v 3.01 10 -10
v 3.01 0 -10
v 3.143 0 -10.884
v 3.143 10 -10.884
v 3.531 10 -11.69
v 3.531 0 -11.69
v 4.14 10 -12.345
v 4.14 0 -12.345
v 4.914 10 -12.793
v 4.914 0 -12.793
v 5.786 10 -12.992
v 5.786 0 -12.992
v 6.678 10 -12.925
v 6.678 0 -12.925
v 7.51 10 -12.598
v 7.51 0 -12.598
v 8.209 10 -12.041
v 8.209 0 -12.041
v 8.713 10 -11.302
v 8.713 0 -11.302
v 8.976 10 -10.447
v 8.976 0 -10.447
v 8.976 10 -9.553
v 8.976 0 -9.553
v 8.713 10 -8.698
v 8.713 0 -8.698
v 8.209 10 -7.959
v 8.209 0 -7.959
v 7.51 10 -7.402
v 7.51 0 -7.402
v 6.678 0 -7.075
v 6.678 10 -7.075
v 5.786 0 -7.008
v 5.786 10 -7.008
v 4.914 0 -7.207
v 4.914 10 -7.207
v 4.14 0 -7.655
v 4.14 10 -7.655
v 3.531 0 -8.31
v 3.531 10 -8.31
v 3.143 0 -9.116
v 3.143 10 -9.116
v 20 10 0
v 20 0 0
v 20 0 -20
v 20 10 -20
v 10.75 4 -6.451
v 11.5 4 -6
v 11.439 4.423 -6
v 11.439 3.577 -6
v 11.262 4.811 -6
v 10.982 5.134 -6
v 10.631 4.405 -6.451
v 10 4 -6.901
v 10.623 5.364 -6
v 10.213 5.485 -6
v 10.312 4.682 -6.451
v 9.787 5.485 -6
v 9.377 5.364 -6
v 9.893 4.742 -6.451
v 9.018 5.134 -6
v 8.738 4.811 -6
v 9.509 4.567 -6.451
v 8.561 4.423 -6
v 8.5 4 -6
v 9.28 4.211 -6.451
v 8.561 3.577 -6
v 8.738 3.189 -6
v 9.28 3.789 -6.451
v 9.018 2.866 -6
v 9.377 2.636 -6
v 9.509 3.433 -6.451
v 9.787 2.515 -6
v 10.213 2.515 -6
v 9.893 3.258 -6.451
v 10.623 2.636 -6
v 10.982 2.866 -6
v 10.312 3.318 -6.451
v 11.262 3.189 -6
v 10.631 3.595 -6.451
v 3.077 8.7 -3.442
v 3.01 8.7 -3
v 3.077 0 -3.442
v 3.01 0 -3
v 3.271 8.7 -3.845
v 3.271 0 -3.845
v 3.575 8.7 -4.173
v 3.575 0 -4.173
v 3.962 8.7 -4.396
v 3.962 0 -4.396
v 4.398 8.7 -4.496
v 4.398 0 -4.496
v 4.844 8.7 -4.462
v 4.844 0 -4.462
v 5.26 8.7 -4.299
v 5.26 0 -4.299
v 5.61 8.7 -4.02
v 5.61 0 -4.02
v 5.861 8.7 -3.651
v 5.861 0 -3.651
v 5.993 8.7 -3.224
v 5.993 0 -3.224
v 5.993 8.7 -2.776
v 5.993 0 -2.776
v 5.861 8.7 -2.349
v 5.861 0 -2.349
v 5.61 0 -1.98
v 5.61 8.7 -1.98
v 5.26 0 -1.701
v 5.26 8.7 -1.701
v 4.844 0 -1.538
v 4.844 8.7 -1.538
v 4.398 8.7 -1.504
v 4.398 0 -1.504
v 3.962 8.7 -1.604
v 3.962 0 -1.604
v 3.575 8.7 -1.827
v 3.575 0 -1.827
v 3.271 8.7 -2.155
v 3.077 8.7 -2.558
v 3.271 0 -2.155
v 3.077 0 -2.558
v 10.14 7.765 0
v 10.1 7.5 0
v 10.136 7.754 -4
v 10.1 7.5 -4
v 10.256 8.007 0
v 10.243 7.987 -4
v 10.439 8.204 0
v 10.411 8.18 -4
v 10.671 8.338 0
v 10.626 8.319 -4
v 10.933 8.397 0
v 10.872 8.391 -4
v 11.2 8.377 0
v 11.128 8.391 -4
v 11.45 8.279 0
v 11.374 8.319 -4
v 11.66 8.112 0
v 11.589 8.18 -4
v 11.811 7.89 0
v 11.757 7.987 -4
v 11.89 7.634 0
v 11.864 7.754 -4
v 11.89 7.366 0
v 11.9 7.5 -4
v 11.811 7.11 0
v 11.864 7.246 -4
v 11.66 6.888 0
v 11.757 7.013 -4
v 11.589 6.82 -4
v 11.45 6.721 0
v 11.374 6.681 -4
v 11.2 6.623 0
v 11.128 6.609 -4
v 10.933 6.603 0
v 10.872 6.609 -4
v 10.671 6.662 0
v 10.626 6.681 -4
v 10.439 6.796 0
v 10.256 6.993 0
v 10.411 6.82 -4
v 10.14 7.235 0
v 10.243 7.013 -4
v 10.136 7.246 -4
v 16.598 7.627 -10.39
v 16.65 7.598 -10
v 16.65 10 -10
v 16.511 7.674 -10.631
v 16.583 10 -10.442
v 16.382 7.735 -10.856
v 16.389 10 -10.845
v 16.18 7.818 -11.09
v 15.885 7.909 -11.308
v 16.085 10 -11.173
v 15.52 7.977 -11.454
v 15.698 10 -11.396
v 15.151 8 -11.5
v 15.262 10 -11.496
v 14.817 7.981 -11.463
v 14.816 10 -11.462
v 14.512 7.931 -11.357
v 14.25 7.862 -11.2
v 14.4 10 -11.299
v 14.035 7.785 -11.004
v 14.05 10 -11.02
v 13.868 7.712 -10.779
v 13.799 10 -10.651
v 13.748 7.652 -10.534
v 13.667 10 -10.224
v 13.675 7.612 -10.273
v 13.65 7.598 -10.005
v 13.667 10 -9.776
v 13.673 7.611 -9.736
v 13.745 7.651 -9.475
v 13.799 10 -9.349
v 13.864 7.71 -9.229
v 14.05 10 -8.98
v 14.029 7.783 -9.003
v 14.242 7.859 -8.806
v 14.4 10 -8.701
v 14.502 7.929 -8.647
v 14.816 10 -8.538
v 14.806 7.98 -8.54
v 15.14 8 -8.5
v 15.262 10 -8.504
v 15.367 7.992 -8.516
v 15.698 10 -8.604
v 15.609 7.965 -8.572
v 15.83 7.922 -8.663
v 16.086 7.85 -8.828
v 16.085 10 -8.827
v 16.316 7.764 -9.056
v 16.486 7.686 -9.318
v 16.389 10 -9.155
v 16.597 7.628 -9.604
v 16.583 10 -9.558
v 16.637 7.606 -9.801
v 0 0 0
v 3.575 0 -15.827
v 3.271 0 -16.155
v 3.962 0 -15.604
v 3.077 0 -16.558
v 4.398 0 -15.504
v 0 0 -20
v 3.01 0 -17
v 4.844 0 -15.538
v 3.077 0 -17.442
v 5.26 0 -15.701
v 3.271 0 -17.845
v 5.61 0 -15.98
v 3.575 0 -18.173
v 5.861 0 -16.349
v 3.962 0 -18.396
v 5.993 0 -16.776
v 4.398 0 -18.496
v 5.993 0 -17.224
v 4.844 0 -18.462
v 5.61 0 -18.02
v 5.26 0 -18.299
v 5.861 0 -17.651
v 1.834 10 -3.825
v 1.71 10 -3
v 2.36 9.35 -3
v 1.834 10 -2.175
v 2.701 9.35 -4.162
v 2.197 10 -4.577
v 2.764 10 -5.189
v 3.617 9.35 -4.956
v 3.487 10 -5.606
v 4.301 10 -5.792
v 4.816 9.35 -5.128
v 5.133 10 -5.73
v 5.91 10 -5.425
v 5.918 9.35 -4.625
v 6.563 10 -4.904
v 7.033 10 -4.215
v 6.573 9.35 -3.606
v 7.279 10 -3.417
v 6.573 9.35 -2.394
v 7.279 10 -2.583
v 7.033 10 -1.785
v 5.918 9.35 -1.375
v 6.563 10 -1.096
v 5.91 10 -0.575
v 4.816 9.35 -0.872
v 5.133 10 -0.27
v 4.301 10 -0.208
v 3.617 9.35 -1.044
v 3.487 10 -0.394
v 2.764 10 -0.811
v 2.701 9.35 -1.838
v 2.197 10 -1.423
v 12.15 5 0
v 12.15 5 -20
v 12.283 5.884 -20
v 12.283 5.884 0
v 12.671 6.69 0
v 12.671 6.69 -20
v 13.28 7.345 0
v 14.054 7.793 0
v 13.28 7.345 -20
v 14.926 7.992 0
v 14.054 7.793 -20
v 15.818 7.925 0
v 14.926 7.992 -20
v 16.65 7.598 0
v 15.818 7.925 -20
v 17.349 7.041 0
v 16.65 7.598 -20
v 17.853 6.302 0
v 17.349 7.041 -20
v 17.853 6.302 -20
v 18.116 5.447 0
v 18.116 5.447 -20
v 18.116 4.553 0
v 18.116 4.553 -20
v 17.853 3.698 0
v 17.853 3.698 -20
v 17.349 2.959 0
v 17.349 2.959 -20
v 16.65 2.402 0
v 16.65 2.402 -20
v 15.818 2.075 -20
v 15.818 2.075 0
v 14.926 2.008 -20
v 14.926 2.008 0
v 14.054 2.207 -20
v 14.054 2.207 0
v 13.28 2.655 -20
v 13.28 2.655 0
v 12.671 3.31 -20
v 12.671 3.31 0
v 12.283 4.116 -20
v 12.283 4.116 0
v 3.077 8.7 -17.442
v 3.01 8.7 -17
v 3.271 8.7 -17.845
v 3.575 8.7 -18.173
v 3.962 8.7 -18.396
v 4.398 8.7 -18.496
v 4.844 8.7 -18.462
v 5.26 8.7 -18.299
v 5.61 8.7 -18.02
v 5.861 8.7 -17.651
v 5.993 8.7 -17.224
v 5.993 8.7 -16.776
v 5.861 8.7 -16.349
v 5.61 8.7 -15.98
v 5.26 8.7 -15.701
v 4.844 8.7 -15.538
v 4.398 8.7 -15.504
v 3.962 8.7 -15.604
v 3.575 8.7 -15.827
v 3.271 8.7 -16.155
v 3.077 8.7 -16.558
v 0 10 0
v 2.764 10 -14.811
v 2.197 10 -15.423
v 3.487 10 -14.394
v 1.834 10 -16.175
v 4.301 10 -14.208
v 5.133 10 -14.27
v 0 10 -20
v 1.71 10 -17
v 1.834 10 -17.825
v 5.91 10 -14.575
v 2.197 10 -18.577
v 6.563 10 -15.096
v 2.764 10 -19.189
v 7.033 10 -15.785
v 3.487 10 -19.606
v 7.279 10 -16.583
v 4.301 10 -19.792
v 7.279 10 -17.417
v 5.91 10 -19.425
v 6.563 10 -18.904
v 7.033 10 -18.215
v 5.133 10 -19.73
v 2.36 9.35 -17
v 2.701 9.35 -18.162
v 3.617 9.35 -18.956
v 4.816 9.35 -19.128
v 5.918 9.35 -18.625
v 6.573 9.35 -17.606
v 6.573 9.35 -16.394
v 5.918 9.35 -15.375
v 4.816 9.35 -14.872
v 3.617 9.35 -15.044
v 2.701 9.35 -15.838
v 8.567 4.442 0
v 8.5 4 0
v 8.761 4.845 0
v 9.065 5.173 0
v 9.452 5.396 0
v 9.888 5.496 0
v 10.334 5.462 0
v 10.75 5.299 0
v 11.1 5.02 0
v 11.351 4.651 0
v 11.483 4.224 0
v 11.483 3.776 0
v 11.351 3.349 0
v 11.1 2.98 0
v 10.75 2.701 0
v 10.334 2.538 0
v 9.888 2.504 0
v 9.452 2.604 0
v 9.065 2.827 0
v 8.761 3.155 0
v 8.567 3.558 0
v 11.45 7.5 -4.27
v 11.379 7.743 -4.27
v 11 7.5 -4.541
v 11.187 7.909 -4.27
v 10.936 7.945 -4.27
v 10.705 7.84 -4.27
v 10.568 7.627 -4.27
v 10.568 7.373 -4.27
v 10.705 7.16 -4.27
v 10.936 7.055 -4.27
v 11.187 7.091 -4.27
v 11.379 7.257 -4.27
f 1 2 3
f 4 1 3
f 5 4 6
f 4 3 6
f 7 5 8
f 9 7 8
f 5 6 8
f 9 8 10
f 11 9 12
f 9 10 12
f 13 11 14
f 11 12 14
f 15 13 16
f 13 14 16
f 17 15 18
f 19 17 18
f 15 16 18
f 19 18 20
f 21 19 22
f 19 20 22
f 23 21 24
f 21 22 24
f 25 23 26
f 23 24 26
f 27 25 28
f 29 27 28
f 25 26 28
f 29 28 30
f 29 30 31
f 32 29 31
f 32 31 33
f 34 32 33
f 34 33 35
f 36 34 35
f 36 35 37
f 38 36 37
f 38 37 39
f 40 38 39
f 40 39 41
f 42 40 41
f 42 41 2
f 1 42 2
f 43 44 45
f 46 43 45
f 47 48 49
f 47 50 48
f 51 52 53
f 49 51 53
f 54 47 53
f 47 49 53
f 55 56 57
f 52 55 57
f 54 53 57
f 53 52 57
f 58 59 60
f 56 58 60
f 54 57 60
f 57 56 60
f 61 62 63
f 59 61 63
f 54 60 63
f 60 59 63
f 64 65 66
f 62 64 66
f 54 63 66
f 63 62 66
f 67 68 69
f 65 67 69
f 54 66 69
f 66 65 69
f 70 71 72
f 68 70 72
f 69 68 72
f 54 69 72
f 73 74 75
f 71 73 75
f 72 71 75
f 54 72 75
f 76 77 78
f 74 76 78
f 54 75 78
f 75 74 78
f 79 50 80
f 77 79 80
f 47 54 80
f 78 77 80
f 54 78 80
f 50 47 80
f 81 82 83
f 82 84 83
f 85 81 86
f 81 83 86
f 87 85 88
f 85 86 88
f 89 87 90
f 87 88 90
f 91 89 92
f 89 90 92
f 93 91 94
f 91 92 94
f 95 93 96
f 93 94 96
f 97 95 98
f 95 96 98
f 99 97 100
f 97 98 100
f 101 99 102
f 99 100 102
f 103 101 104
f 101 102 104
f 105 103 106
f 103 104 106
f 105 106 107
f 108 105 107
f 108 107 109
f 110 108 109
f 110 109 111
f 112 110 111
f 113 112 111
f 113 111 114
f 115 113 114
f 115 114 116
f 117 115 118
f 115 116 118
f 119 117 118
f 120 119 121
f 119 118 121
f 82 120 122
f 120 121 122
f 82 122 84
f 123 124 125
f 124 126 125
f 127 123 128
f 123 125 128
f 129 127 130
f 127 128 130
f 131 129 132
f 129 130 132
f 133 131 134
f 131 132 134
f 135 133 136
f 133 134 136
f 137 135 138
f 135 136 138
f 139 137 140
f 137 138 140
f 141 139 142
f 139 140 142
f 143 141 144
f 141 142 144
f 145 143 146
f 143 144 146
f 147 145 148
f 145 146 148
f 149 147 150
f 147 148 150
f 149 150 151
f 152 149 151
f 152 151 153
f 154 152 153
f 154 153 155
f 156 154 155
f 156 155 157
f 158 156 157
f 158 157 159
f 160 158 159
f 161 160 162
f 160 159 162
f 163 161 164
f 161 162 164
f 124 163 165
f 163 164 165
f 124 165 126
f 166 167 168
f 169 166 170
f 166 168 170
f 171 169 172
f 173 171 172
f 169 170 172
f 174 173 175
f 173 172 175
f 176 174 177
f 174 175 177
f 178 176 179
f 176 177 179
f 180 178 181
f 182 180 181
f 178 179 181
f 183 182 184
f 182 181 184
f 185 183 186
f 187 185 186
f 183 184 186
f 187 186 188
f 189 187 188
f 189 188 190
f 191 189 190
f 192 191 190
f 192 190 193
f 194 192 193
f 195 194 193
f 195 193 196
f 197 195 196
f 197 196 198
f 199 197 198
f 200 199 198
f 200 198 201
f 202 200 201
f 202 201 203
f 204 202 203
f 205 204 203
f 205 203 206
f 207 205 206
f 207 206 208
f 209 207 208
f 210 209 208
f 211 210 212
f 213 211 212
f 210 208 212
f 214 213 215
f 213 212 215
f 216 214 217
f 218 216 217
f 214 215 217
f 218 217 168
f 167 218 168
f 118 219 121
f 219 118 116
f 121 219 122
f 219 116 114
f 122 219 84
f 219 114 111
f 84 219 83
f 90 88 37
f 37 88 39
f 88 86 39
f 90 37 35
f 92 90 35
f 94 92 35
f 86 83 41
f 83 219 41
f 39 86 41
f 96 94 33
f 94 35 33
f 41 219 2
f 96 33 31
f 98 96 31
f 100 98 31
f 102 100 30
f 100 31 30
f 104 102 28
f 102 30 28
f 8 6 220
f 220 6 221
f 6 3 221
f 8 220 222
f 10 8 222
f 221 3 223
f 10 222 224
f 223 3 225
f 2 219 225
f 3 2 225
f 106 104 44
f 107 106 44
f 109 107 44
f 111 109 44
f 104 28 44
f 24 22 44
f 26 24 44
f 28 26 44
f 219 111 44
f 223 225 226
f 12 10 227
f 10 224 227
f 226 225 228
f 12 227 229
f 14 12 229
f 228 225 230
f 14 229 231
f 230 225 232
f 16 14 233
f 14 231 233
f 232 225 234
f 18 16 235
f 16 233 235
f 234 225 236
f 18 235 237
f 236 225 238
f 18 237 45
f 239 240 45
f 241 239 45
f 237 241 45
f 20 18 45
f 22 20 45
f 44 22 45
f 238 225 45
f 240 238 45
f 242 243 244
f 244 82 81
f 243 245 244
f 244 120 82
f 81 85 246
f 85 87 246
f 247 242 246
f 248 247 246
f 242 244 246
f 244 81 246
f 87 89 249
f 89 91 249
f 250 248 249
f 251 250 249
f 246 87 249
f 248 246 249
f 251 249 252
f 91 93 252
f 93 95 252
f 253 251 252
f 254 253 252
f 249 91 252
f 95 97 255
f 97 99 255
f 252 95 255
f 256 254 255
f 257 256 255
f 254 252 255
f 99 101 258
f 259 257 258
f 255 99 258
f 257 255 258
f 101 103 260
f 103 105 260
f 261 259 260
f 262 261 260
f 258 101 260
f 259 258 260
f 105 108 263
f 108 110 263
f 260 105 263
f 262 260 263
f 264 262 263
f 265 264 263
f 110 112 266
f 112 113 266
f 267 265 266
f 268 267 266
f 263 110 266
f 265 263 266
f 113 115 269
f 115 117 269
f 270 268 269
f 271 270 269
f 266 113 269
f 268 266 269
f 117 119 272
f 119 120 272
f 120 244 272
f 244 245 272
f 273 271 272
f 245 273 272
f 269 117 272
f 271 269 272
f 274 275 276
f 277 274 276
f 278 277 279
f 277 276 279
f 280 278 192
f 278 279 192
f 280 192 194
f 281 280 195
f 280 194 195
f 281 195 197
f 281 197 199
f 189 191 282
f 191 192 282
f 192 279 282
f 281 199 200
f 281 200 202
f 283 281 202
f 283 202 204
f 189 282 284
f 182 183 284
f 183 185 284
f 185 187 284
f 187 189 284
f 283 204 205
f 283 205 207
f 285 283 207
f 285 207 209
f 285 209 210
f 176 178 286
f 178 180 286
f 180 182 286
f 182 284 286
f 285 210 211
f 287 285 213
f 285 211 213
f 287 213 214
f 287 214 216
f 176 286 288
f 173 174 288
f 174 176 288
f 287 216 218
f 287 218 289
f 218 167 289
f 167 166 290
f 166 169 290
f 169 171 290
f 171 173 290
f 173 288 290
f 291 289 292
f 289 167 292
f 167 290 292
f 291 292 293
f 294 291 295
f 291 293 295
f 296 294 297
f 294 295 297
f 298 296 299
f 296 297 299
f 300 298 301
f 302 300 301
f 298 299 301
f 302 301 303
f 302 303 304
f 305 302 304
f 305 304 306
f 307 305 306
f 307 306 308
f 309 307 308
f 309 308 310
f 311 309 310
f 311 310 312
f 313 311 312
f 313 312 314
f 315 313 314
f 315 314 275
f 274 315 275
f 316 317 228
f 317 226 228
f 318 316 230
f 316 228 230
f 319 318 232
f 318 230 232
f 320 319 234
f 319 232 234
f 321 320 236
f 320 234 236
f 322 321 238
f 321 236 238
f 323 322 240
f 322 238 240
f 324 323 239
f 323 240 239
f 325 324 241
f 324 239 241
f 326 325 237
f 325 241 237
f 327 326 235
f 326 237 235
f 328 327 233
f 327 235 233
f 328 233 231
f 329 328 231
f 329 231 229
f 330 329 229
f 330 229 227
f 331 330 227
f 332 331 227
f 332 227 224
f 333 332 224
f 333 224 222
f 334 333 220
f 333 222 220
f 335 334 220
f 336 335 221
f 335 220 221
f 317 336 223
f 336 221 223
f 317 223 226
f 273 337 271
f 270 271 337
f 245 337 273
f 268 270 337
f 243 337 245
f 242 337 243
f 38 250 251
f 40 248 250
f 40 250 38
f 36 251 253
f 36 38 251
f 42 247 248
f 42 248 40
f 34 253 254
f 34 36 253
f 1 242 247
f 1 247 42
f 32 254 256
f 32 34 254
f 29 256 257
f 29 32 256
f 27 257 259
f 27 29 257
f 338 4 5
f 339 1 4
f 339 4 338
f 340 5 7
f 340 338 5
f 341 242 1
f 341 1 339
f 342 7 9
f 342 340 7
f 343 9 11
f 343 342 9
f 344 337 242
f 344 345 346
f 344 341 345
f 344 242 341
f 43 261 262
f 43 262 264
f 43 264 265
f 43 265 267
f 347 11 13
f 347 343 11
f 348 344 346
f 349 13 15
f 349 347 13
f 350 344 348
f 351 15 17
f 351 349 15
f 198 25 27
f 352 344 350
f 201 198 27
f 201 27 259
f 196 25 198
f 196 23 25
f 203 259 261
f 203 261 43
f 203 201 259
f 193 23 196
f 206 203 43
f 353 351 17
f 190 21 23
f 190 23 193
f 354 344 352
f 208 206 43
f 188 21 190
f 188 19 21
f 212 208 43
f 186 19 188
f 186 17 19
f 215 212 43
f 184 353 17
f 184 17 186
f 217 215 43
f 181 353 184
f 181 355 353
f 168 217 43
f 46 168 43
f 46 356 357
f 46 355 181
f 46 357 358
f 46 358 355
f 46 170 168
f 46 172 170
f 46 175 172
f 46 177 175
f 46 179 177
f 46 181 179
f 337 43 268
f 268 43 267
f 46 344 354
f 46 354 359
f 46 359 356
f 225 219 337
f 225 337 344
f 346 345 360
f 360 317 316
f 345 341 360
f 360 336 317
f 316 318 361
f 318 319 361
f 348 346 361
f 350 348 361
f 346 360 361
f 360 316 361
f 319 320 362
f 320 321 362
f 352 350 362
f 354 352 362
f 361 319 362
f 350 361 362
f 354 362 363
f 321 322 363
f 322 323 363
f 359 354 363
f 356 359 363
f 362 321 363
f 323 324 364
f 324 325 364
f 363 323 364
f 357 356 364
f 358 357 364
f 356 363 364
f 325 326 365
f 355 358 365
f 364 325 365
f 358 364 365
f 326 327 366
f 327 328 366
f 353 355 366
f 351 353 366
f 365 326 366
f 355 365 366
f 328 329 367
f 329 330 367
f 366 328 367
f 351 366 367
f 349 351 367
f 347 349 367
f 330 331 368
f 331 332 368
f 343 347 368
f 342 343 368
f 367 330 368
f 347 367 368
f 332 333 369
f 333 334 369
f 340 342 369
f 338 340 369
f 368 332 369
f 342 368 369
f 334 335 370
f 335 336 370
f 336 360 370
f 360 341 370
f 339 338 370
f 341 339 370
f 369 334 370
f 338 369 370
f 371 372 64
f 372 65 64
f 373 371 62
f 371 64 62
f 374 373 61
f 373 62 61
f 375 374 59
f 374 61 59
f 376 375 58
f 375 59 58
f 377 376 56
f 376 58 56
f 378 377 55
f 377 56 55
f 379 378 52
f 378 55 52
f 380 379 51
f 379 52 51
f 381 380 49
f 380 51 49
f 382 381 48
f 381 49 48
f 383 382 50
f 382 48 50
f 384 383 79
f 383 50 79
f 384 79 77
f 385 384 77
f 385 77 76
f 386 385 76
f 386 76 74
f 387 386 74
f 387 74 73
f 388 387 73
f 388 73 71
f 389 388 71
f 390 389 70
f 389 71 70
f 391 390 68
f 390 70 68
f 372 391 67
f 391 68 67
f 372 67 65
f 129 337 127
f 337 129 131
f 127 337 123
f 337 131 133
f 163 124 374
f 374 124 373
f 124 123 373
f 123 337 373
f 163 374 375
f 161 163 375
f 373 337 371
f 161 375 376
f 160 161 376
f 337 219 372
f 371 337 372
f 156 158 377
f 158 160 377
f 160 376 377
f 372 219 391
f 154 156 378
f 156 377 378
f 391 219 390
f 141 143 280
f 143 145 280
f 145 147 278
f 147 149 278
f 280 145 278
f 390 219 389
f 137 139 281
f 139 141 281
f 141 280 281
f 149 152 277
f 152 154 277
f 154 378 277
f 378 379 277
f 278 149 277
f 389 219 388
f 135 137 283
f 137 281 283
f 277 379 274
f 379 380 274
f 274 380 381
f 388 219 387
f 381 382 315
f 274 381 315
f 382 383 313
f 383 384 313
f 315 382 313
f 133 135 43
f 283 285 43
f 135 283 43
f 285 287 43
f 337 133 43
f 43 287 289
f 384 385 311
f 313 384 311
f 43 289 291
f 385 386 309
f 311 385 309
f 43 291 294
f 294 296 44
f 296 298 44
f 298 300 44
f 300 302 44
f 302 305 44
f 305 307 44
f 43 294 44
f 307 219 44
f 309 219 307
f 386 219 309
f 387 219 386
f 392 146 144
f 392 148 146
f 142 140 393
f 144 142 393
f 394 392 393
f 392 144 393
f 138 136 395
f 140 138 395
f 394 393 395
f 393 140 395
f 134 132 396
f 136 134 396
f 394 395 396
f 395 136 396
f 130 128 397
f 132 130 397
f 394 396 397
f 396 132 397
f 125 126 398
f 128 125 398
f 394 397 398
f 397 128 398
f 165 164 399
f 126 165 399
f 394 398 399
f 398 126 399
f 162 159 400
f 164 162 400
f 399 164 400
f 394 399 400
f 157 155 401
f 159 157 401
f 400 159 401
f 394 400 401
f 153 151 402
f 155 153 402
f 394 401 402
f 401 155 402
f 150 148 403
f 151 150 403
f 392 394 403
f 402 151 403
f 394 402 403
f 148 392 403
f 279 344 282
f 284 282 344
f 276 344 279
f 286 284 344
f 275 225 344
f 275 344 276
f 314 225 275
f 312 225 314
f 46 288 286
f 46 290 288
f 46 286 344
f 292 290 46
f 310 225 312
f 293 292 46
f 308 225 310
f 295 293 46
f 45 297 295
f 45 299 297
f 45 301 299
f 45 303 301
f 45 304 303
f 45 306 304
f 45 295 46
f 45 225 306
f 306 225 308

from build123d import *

# Parameters (mm, degrees)
SKETCH1_W                                       = 20
SKETCH1_H                                       = 20
BOSS_EXTRUDE1_DEPTH                             = 10
F_6_0MM_DOWEL_HOLE2_D                           = 6
CSK_FOR_M3_FLAT_HEAD_MACHINE_SCREW1_D           = 3
CSK_FOR_M3_FLAT_HEAD_MACHINE_SCREW1_CSINK_D     = 5.6
CSK_FOR_M3_FLAT_HEAD_MACHINE_SCREW1_CSINK_ANGLE = 90
F_6_0MM_DOWEL_HOLE3_D                           = 6
F_3_0MM_DOWEL_HOLE1_REACH                       = 32
F_3_0MM_DOWEL_HOLE1_BORE_R                      = 1.5
F_3_0MM_DOWEL_HOLE2_D                           = 3
F_3_0MM_DOWEL_HOLE2_DEPTH                       = 6
F_3_0MM_DOWEL_HOLE2_TIP                         = 0.901290929
F_1_5MM_DOWEL_HOLE1_D                           = 1.8
F_1_5MM_DOWEL_HOLE1_DEPTH                       = 4
F_1_5MM_DOWEL_HOLE1_TIP                         = 0.540774557


with BuildPart() as part:
    # Sketch1 → Boss-Extrude1 (new body)
    with BuildSketch(Plane(origin=(0, 0, 0), x_dir=(1, 0, 0), z_dir=(0, 1, 0))):
        with Locations((10, 10)):
            Rectangle(SKETCH1_W, SKETCH1_H)
    extrude(amount=BOSS_EXTRUDE1_DEPTH)

    # Ø6.0mm Dowel Hole2 (through all)
    with Locations(Plane(origin=(0, 10, 0), x_dir=(1, 0, 0), z_dir=(0, 1, 0))):
        with Locations((6.01, 10)):
            Hole(F_6_0MM_DOWEL_HOLE2_D / 2)

    # CSK for M3 Flat Head Machine Screw1 (through all)
    with Locations(Plane(origin=(0, 10, 0), x_dir=(1, 0, 0), z_dir=(0, 1, 0))):
        with Locations((4.51, 3), (4.51, 17)):
            CounterSinkHole(CSK_FOR_M3_FLAT_HEAD_MACHINE_SCREW1_D / 2, CSK_FOR_M3_FLAT_HEAD_MACHINE_SCREW1_CSINK_D / 2, counter_sink_angle=CSK_FOR_M3_FLAT_HEAD_MACHINE_SCREW1_CSINK_ANGLE)

    # Ø6.0mm Dowel Hole3 (through all)
    with Locations(Plane.XY):
        with Locations((15.15, 5)):
            Hole(F_6_0MM_DOWEL_HOLE3_D / 2)

    # Ø3.0mm Dowel Hole1 bore → Ø3.0mm Dowel Hole1 (cut, up to next)
    with BuildSketch(Plane(origin=(0, 10, 0), x_dir=(1, 0, 0), z_dir=(0, 1, 0)), mode=Mode.PRIVATE) as f_3_0mm_dowel_hole1_sk1:
        with Locations((15.15, 10)):
            Circle(F_3_0MM_DOWEL_HOLE1_BORE_R)
    f_3_0mm_dowel_hole1_tool1 = extrude(f_3_0mm_dowel_hole1_sk1.sketch, amount=-F_3_0MM_DOWEL_HOLE1_REACH, mode=Mode.PRIVATE) & part.part
    add(f_3_0mm_dowel_hole1_tool1.solids().sort_by_distance((15.15, 10, -10))[0], mode=Mode.SUBTRACT)

    # Ø3.0mm Dowel Hole2
    with Locations(Plane.XY):
        with Locations((10, 4)):
            Hole(F_3_0MM_DOWEL_HOLE2_D / 2, depth=F_3_0MM_DOWEL_HOLE2_DEPTH)
            with Locations((0, 0, -(F_3_0MM_DOWEL_HOLE2_DEPTH + F_3_0MM_DOWEL_HOLE2_TIP / 2))):  # 118° drill point
                Cone(0, F_3_0MM_DOWEL_HOLE2_D / 2, F_3_0MM_DOWEL_HOLE2_TIP, mode=Mode.SUBTRACT)

    # Ø1.5mm Dowel Hole1
    with Locations(Plane.XY):
        with Locations((11, 7.5)):
            Hole(F_1_5MM_DOWEL_HOLE1_D / 2, depth=F_1_5MM_DOWEL_HOLE1_DEPTH)
            with Locations((0, 0, -(F_1_5MM_DOWEL_HOLE1_DEPTH + F_1_5MM_DOWEL_HOLE1_TIP / 2))):  # 118° drill point
                Cone(0, F_1_5MM_DOWEL_HOLE1_D / 2, F_1_5MM_DOWEL_HOLE1_TIP, mode=Mode.SUBTRACT)


solid = part.part
